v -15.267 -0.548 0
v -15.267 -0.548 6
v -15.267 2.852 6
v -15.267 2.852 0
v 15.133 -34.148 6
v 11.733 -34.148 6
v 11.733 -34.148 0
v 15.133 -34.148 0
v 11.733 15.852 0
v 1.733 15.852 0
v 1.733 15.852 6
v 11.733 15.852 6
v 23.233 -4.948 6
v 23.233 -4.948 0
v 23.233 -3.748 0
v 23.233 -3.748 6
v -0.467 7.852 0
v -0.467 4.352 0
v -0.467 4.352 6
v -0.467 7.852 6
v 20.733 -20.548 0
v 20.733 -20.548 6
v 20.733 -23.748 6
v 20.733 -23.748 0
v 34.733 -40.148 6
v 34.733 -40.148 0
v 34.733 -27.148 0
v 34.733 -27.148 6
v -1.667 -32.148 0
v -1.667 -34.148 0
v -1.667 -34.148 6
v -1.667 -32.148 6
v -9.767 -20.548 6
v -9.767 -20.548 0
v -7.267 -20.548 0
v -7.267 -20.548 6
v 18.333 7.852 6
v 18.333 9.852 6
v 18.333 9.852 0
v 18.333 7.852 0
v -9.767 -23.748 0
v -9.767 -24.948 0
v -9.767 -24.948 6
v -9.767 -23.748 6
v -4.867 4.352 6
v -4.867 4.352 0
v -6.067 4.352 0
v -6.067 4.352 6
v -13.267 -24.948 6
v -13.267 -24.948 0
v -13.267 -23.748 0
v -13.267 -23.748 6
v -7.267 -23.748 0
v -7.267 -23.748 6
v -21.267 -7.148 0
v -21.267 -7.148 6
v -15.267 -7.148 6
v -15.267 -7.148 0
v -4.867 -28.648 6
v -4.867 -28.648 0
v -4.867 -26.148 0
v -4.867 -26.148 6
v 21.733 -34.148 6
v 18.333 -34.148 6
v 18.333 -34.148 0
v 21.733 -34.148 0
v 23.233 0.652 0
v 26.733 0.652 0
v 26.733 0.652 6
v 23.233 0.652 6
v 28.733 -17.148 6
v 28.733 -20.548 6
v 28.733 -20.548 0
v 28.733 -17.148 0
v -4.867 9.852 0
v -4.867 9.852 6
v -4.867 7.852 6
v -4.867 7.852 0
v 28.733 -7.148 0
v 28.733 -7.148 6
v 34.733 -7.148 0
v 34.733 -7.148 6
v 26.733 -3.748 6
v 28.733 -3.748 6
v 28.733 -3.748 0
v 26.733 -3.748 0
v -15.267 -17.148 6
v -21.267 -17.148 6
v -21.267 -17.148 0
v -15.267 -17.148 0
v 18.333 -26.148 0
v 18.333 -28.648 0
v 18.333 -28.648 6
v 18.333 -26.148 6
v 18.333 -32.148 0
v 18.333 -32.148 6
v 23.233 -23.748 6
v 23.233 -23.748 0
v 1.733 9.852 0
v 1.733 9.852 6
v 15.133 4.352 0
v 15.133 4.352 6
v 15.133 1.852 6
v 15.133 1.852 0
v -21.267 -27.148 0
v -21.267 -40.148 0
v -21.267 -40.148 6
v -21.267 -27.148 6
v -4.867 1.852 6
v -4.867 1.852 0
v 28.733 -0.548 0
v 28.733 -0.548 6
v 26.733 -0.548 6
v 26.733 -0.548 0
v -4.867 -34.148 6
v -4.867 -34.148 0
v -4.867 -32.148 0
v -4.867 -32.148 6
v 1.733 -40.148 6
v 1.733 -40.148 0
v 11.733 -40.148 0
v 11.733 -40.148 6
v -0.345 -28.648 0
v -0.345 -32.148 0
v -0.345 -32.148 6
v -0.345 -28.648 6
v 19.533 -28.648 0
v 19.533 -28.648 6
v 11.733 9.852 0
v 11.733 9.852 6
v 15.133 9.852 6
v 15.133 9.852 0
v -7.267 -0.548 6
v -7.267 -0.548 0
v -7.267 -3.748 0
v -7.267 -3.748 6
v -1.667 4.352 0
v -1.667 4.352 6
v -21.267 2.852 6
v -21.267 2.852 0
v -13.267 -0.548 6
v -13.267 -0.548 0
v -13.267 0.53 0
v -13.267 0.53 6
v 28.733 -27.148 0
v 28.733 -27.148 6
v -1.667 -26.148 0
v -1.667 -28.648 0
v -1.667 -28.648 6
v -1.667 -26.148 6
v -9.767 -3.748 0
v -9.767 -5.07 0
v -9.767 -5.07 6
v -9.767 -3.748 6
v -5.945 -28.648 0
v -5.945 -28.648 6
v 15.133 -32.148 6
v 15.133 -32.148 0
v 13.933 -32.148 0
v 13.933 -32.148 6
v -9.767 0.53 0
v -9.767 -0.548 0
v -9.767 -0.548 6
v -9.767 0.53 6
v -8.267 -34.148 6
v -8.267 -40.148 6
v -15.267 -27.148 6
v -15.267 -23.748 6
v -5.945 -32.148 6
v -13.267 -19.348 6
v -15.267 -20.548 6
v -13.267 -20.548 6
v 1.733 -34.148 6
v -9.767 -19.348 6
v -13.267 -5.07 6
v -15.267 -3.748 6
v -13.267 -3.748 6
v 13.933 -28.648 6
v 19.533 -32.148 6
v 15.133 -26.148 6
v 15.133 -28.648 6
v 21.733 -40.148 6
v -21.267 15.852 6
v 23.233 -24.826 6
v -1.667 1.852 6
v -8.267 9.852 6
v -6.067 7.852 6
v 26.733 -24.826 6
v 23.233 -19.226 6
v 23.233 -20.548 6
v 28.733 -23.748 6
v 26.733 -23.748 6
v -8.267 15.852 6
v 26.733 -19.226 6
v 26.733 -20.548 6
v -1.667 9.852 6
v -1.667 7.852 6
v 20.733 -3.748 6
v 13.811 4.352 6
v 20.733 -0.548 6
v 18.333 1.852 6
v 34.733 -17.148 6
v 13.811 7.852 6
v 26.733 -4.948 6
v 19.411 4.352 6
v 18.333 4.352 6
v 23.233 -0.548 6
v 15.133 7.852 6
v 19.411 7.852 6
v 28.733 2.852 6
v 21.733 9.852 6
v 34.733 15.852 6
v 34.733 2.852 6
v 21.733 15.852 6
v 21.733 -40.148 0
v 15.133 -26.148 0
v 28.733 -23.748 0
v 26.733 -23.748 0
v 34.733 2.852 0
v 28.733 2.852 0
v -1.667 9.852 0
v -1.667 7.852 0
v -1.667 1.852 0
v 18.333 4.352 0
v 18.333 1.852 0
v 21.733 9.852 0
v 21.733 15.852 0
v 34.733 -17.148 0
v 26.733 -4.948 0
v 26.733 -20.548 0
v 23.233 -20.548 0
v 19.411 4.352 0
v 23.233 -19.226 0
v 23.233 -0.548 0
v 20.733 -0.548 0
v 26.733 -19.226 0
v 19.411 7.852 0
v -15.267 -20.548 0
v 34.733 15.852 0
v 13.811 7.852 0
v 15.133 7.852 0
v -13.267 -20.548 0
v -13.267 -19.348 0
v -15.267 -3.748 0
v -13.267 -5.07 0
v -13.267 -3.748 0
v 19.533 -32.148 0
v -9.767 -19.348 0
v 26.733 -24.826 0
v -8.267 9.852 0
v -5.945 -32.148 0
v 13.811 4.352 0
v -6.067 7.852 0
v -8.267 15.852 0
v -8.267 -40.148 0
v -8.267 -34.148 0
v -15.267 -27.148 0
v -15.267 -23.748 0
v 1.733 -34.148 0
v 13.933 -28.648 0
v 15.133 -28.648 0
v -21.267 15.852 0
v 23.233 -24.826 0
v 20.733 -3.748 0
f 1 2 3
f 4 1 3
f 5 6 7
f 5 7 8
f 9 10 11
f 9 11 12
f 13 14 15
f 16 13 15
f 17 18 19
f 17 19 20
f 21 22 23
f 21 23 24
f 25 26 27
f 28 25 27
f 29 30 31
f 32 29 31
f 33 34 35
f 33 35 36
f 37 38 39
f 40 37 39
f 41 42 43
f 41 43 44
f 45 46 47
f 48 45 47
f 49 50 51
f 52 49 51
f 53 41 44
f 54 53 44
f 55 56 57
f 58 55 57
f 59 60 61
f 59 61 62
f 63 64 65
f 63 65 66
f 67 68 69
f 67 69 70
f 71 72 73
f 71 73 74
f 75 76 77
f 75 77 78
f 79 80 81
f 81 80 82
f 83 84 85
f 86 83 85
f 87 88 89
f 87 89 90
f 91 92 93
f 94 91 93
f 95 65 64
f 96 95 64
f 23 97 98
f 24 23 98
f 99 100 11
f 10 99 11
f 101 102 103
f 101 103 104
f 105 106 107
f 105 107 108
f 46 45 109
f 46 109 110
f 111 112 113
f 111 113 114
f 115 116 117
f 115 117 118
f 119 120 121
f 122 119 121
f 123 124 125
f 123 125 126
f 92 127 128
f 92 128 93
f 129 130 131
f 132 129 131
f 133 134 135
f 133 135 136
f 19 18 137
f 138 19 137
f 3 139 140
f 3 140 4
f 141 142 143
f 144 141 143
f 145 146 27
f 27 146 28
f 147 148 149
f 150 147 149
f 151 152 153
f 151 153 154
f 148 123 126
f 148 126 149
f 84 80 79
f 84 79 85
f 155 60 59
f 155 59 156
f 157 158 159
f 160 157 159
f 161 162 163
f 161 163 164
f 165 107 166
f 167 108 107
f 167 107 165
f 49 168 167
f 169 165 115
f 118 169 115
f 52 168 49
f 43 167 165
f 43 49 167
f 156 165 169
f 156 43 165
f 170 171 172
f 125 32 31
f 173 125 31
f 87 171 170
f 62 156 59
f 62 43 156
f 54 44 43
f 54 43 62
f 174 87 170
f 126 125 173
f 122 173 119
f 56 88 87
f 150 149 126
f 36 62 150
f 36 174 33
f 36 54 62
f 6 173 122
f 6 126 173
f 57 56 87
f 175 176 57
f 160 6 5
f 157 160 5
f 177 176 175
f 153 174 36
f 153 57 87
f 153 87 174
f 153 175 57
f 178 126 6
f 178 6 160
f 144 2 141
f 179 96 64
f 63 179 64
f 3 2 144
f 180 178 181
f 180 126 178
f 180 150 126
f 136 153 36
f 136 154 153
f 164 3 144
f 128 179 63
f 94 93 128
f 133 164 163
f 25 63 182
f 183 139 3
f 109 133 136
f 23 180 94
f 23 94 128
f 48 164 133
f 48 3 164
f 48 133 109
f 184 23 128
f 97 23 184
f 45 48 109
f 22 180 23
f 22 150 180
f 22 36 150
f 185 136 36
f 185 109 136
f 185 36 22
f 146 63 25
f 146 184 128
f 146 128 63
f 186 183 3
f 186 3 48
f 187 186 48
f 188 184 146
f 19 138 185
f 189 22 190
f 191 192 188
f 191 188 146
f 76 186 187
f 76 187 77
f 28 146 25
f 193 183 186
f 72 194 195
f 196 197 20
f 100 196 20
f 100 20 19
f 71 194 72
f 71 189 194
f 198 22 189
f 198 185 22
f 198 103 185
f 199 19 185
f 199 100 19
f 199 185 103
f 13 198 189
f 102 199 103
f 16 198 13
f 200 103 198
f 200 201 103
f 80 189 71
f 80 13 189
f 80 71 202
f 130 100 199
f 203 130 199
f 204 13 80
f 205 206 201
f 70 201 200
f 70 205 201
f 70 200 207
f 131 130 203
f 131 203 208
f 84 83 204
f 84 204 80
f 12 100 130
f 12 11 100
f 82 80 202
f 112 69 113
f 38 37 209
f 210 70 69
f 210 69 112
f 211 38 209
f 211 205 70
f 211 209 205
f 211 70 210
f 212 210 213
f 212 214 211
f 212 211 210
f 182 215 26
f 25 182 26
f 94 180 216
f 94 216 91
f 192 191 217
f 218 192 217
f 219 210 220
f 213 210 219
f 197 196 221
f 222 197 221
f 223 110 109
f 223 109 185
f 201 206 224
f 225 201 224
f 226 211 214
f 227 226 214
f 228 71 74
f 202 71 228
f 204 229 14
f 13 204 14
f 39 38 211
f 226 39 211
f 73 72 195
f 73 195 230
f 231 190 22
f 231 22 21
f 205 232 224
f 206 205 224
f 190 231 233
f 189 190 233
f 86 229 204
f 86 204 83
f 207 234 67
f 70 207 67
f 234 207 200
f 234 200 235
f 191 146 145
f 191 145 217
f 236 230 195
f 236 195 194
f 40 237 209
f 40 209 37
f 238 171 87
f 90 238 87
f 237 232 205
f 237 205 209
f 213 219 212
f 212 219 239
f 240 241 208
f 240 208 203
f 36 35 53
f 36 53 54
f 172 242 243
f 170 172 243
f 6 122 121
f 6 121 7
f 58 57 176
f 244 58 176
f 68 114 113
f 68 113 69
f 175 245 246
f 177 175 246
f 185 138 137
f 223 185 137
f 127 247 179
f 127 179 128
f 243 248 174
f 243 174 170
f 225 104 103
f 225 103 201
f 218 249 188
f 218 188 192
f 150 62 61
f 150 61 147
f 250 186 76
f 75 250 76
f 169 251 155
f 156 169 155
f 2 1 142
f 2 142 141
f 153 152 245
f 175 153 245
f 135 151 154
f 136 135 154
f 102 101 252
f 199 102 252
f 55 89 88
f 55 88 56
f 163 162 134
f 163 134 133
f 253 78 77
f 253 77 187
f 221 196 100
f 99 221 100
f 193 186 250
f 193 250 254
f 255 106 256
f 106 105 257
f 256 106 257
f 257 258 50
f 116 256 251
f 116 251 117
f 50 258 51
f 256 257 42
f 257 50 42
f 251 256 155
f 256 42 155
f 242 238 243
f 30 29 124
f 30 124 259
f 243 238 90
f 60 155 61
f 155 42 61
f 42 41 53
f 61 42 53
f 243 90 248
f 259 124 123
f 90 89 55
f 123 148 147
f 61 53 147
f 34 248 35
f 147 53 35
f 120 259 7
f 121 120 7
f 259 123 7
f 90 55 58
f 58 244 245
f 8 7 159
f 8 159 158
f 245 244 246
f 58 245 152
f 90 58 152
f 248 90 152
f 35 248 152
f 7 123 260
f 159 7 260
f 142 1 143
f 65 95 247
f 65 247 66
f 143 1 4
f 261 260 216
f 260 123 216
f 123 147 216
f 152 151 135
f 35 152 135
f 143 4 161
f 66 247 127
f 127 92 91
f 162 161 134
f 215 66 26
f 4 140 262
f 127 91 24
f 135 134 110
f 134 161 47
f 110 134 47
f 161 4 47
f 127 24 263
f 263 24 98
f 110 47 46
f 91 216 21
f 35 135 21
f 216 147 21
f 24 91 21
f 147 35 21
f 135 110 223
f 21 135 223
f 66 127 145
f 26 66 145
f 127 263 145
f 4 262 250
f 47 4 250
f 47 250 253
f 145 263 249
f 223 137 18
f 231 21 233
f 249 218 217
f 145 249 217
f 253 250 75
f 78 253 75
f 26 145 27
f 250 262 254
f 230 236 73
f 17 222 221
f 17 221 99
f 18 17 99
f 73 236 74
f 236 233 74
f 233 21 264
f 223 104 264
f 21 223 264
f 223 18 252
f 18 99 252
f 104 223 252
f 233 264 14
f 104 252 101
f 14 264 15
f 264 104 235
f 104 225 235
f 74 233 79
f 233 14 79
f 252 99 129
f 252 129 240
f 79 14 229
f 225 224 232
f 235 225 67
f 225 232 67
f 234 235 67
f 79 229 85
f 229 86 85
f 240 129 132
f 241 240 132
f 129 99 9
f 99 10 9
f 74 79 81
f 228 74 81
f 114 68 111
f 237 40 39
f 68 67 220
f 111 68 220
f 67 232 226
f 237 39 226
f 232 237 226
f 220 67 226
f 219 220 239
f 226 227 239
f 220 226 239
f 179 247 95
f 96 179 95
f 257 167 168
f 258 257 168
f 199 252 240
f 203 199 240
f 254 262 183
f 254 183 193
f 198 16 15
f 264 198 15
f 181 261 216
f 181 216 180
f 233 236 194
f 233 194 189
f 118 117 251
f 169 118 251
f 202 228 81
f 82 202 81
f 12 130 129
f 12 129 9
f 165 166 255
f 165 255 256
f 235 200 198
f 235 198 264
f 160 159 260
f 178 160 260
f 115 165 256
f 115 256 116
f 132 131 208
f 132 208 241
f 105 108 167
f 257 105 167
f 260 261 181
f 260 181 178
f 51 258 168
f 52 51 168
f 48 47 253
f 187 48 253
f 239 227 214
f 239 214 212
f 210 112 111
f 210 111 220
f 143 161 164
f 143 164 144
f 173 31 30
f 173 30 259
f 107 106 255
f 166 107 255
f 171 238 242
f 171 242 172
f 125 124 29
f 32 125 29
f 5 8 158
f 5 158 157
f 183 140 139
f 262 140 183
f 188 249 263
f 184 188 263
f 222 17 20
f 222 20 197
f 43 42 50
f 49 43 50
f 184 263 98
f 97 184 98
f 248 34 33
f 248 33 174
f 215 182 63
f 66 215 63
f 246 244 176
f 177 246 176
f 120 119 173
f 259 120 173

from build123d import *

# Parameters (mm, degrees)
SKETCH1_W           = 56
SKETCH1_H           = 56
BOSS_EXTRUDE1_DEPTH = 6
SKETCH2_W           = 10
SKETCH2_H           = 6
SKETCH2_W_2         = 6
SKETCH2_H_2         = 10
CUT_EXTRUDE1_DEPTH  = 54.425204723
SKETCH4_W           = 3.2
SKETCH4_H           = 6
CUT_EXTRUDE2_DEPTH  = 8
SKETCH10_W          = 6
SKETCH10_H          = 3.2
CUT_EXTRUDE7_DEPTH  = 8
SKETCH11_W          = 3.2
SKETCH11_H          = 6
CUT_EXTRUDE8_DEPTH  = 8
SKETCH12_W          = 6
SKETCH12_H          = 3.2
CUT_EXTRUDE9_DEPTH  = 8
SKETCH13_W          = 3.5
SKETCH13_H          = 5.6
SKETCH13_W_2        = 5.6
SKETCH13_H_2        = 3.5
CUT_EXTRUDE10_DEPTH = 54.425204723


with BuildPart() as part:
    # Sketch1 → Boss-Extrude1 (new body)
    with BuildSketch(Plane.XY):
        with Locations((6.733082315, -12.148044693)):
            Rectangle(SKETCH1_W, SKETCH1_H)
    extrude(amount=BOSS_EXTRUDE1_DEPTH)

    # Sketch2 → Cut-Extrude1 (cut, through all)
    with BuildSketch(Plane.XY.offset(6)):
        with Locations((-3.266917685, 12.851955307)):
            Rectangle(SKETCH2_W, SKETCH2_H)
        with Locations((16.733082315, 12.851955307)):
            Rectangle(SKETCH2_W, SKETCH2_H)
        with Locations((31.733082315, -2.148044693)):
            Rectangle(SKETCH2_W_2, SKETCH2_H_2)
        with Locations((31.733082315, -22.148044693)):
            Rectangle(SKETCH2_W_2, SKETCH2_H_2)
        with Locations((16.733082315, -37.148044693)):
            Rectangle(SKETCH2_W, SKETCH2_H)
        with Locations((-3.266917685, -37.148044693)):
            Rectangle(SKETCH2_W, SKETCH2_H)
        with Locations((-18.266917685, -22.148044693)):
            Rectangle(SKETCH2_W_2, SKETCH2_H_2)
        with Locations((-18.266917685, -2.148044693)):
            Rectangle(SKETCH2_W_2, SKETCH2_H_2)
    extrude(amount=-CUT_EXTRUDE1_DEPTH, mode=Mode.SUBTRACT)

    # Sketch4 → Cut-Extrude2 (cut)
    with BuildSketch(Plane(origin=(0, 9.851955307, 0), x_dir=(1, 0, 0), z_dir=(0, 1, 0))):
        with Locations((16.733082315, -3)):
            Rectangle(SKETCH4_W, SKETCH4_H)
        with Locations((-3.266917685, -3)):
            Rectangle(SKETCH4_W, SKETCH4_H)
    extrude(amount=-CUT_EXTRUDE2_DEPTH, mode=Mode.SUBTRACT)

    # Sketch10 → Cut-Extrude7 (cut)
    with BuildSketch(Plane(origin=(28.733082315, 0, 0), x_dir=(0, 0, -1), z_dir=(1, 0, 0))):
        with Locations((-3, -2.148044693)):
            Rectangle(SKETCH10_W, SKETCH10_H)
        with Locations((-3, -22.148044693)):
            Rectangle(SKETCH10_W, SKETCH10_H)
    extrude(amount=-CUT_EXTRUDE7_DEPTH, mode=Mode.SUBTRACT)

    # Sketch11 → Cut-Extrude8 (cut)
    with BuildSketch(Plane.XZ.offset(34.148044693)):
        with Locations((16.733082315, 3)):
            Rectangle(SKETCH11_W, SKETCH11_H)
        with Locations((-3.266917685, 3)):
            Rectangle(SKETCH11_W, SKETCH11_H)
    extrude(amount=-CUT_EXTRUDE8_DEPTH, mode=Mode.SUBTRACT)

    # Sketch12 → Cut-Extrude9 (cut)
    with BuildSketch(Plane.ZY.offset(15.266917685)):
        with Locations((3, -2.148044693)):
            Rectangle(SKETCH12_W, SKETCH12_H)
        with Locations((3, -22.148044693)):
            Rectangle(SKETCH12_W, SKETCH12_H)
    extrude(amount=-CUT_EXTRUDE9_DEPTH, mode=Mode.SUBTRACT)

    # Sketch13 → Cut-Extrude10 (cut, through all)
    with BuildSketch(Plane(origin=(0, 0, 0), x_dir=(-1, 0, 0), z_dir=(0, 0, -1))):
        with Locations((-24.983082315, -22.025968928)):
            Rectangle(SKETCH13_W, SKETCH13_H)
        with Locations((-16.61100655, 6.101955307)):
            Rectangle(SKETCH13_W_2, SKETCH13_H_2)
        with Locations((-24.983082315, -2.148044693)):
            Rectangle(SKETCH13_W, SKETCH13_H)
        with Locations((3.266917685, 6.101955307)):
            Rectangle(SKETCH13_W_2, SKETCH13_H_2)
        with Locations((11.516917685, -2.270120458)):
            Rectangle(SKETCH13_W, SKETCH13_H)
        with Locations((11.516917685, -22.148044693)):
            Rectangle(SKETCH13_W, SKETCH13_H)
        with Locations((3.14484192, -30.398044693)):
            Rectangle(SKETCH13_W_2, SKETCH13_H_2)
        with Locations((-16.733082315, -30.398044693)):
            Rectangle(SKETCH13_W_2, SKETCH13_H_2)
    extrude(amount=-CUT_EXTRUDE10_DEPTH, mode=Mode.SUBTRACT)


solid = part.part
